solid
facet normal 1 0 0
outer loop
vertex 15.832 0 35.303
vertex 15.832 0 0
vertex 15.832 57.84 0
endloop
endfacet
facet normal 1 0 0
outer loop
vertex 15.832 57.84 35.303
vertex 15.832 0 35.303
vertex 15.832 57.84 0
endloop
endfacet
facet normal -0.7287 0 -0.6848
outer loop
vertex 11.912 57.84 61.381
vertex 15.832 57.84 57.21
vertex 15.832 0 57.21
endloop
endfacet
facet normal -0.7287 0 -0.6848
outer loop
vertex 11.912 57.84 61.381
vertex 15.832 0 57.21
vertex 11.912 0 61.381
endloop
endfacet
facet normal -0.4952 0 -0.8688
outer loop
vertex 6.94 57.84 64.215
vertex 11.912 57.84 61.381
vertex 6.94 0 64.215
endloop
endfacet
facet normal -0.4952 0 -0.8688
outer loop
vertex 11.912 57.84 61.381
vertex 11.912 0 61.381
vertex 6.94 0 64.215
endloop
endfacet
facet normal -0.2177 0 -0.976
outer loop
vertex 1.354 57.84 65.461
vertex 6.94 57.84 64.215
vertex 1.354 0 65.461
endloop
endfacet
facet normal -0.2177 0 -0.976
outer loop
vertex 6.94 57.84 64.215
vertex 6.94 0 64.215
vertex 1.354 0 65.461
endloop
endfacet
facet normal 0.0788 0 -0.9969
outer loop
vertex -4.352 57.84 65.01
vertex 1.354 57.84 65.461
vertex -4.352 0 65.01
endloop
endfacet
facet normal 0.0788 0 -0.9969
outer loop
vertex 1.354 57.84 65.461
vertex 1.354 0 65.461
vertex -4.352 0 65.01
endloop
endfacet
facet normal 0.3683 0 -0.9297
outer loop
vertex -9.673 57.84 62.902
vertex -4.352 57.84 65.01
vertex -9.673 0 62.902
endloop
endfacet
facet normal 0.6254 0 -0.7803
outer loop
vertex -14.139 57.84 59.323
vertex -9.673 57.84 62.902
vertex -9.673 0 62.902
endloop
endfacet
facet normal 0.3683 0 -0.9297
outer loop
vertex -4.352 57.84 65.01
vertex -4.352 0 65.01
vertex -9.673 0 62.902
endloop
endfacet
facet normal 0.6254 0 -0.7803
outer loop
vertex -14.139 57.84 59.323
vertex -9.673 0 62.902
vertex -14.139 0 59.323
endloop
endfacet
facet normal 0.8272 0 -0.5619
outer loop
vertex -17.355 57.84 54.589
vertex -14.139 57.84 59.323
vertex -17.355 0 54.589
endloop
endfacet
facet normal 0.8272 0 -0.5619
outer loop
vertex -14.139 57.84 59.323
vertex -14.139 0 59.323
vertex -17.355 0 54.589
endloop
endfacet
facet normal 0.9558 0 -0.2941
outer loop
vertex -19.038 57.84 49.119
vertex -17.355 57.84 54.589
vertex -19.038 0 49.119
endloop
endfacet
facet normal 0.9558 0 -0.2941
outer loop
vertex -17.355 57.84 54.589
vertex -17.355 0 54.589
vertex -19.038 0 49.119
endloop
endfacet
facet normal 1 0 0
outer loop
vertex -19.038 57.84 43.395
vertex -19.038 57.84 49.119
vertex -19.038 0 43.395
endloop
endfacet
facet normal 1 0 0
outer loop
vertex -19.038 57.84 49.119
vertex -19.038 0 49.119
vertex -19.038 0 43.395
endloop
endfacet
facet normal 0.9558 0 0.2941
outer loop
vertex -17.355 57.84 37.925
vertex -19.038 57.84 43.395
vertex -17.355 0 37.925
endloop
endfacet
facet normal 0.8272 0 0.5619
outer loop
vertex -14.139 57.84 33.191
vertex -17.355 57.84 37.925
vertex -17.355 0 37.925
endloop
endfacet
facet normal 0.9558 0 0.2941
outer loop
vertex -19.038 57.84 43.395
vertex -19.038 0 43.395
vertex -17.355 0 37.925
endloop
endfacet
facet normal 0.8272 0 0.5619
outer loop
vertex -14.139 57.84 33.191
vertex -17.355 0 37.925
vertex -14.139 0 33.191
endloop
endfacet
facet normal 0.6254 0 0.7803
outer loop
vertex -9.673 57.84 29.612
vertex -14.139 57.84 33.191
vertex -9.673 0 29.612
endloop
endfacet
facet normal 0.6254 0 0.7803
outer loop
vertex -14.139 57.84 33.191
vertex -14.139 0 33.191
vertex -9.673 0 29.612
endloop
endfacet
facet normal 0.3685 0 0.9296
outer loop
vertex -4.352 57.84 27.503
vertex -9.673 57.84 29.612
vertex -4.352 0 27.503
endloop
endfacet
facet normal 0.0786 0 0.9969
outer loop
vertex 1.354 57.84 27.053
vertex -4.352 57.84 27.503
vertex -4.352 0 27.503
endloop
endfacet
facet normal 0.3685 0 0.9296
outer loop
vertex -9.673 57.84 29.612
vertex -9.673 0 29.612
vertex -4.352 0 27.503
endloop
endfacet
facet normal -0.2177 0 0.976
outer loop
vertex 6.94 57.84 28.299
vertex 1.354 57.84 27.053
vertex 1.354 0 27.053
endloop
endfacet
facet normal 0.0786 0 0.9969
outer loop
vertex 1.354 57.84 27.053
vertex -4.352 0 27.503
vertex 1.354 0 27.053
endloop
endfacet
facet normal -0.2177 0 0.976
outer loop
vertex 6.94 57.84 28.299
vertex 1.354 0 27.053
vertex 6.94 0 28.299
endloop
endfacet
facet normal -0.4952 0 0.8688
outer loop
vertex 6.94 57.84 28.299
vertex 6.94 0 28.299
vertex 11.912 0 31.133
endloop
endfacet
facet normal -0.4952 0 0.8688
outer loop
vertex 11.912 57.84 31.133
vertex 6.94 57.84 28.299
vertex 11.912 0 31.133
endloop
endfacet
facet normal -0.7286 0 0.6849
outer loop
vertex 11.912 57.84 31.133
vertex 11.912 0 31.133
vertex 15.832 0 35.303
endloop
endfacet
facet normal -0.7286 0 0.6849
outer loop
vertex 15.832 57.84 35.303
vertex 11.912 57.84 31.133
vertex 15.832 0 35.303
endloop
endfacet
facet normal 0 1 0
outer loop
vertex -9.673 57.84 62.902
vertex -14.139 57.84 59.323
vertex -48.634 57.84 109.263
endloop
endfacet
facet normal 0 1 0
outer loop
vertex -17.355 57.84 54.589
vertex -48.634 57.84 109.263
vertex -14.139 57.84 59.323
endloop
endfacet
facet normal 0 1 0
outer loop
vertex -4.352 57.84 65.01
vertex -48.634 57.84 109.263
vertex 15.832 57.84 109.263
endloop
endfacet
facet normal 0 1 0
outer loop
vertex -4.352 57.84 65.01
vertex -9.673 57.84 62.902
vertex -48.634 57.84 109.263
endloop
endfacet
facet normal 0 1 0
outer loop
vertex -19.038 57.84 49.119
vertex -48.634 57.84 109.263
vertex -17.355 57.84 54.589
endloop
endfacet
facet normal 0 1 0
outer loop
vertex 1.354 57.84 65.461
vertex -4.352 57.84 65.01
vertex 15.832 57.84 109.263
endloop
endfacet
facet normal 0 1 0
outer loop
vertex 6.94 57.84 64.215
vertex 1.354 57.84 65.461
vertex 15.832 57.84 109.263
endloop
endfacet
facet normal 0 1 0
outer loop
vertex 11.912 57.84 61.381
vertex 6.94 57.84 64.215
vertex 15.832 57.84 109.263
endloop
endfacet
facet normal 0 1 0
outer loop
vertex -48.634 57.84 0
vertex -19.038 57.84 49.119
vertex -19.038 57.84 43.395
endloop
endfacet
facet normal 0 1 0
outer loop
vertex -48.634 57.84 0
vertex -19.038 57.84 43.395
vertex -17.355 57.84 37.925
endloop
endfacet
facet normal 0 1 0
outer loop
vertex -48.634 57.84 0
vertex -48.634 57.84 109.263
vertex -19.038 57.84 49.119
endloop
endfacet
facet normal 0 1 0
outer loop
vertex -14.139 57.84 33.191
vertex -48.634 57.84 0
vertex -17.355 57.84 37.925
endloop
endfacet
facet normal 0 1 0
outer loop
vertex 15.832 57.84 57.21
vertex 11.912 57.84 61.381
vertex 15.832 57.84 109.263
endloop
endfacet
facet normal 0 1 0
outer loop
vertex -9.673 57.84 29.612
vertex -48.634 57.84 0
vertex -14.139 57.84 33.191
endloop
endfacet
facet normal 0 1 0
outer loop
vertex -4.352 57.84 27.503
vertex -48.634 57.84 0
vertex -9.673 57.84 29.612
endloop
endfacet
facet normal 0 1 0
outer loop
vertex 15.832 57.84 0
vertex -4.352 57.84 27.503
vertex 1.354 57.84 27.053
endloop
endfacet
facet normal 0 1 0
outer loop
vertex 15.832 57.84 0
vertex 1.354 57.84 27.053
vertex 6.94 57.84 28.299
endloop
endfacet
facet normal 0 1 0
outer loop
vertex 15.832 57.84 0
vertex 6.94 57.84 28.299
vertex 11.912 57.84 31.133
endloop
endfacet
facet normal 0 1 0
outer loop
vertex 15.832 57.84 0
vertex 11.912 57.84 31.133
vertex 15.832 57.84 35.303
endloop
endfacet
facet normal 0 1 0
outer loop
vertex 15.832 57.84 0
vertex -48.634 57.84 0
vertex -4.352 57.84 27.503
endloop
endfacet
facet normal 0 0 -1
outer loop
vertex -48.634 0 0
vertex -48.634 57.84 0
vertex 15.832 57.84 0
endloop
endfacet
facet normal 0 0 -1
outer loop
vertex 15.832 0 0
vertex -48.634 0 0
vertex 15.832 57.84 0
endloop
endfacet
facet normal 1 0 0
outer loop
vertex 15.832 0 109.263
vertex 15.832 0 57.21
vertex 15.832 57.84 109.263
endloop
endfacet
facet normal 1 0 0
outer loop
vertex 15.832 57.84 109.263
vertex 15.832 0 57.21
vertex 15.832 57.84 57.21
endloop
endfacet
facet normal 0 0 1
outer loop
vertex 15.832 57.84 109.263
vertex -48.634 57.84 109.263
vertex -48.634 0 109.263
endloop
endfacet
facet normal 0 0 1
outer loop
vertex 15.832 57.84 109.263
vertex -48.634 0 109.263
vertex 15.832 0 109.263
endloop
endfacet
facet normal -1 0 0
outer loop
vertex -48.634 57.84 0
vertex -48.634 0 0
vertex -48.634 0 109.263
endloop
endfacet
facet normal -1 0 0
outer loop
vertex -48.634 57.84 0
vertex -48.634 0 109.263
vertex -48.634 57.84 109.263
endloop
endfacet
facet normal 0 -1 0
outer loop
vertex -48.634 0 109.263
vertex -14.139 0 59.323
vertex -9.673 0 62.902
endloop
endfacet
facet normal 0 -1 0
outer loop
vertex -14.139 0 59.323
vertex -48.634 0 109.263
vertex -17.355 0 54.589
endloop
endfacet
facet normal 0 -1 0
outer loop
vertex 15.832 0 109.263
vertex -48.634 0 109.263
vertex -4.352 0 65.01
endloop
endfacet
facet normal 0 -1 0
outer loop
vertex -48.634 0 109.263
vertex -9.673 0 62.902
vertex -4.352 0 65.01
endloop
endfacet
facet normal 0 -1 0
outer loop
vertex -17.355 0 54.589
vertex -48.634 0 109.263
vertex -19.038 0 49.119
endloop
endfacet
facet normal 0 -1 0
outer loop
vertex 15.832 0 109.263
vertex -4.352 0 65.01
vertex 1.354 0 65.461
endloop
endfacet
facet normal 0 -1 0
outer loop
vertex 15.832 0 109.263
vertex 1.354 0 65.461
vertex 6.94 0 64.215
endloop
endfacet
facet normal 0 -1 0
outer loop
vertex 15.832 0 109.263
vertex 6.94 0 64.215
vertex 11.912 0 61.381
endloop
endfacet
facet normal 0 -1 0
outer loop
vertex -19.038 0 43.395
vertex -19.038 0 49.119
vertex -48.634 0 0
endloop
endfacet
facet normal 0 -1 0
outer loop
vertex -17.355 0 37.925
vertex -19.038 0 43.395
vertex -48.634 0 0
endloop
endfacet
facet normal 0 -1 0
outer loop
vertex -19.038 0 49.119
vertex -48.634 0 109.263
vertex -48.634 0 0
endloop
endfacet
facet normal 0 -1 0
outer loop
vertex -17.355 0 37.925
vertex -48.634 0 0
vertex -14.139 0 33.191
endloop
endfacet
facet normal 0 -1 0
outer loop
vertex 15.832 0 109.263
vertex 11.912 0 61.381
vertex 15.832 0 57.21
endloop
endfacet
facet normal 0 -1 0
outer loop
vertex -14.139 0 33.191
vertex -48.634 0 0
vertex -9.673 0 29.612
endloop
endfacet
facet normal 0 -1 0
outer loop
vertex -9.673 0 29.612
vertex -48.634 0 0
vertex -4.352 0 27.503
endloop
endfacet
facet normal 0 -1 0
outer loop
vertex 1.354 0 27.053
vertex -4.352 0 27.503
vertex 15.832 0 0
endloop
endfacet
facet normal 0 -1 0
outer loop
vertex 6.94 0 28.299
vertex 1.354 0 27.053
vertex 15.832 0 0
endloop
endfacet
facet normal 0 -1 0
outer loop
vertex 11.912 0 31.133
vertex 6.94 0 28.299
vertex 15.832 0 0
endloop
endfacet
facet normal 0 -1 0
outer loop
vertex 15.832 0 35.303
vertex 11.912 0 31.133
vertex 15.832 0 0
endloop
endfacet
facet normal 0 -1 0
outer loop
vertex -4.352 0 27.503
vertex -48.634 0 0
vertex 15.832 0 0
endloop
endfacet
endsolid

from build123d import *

# Parameters (mm, degrees)
F0_W     = 64.466022
F0_H     = 57.840139
F2_DEPTH = 109.263172
F4_DEPTH = 25.4
F6_DEPTH = 80.09805


with BuildPart() as f2:
    # F0 (on Top) → F2 (new body)
    with BuildSketch(Plane.XY):
        with Locations((-16.400989, 28.92007)):
            Rectangle(F0_W, F0_H)
    extrude(amount=F2_DEPTH)

    # F3 (on face) → F4 (cut)
    with BuildSketch(Plane.XZ):
        with BuildLine():
            ThreePointArc((15.832022, 35.303479), (18.376977, 40.519505), (19.251797, 46.256961))
            ThreePointArc((19.251797, 46.256961), (18.376977, 51.994417), (15.832022, 57.210442))
            Line((15.832022, 57.210442), (15.832022, 35.303479))
        make_face()
    extrude(amount=-F4_DEPTH, mode=Mode.SUBTRACT)

    # F5 (on face) → F6 (cut)
    with BuildSketch(Plane.XZ):
        with BuildLine():
            ThreePointArc((15.832022, 57.210442), (-19.251797, 46.256961), (15.832022, 35.303479))
            Line((15.832022, 35.303479), (15.832022, 57.210442))
        make_face()
    extrude(amount=-F6_DEPTH, mode=Mode.SUBTRACT)


solid = f2.part
